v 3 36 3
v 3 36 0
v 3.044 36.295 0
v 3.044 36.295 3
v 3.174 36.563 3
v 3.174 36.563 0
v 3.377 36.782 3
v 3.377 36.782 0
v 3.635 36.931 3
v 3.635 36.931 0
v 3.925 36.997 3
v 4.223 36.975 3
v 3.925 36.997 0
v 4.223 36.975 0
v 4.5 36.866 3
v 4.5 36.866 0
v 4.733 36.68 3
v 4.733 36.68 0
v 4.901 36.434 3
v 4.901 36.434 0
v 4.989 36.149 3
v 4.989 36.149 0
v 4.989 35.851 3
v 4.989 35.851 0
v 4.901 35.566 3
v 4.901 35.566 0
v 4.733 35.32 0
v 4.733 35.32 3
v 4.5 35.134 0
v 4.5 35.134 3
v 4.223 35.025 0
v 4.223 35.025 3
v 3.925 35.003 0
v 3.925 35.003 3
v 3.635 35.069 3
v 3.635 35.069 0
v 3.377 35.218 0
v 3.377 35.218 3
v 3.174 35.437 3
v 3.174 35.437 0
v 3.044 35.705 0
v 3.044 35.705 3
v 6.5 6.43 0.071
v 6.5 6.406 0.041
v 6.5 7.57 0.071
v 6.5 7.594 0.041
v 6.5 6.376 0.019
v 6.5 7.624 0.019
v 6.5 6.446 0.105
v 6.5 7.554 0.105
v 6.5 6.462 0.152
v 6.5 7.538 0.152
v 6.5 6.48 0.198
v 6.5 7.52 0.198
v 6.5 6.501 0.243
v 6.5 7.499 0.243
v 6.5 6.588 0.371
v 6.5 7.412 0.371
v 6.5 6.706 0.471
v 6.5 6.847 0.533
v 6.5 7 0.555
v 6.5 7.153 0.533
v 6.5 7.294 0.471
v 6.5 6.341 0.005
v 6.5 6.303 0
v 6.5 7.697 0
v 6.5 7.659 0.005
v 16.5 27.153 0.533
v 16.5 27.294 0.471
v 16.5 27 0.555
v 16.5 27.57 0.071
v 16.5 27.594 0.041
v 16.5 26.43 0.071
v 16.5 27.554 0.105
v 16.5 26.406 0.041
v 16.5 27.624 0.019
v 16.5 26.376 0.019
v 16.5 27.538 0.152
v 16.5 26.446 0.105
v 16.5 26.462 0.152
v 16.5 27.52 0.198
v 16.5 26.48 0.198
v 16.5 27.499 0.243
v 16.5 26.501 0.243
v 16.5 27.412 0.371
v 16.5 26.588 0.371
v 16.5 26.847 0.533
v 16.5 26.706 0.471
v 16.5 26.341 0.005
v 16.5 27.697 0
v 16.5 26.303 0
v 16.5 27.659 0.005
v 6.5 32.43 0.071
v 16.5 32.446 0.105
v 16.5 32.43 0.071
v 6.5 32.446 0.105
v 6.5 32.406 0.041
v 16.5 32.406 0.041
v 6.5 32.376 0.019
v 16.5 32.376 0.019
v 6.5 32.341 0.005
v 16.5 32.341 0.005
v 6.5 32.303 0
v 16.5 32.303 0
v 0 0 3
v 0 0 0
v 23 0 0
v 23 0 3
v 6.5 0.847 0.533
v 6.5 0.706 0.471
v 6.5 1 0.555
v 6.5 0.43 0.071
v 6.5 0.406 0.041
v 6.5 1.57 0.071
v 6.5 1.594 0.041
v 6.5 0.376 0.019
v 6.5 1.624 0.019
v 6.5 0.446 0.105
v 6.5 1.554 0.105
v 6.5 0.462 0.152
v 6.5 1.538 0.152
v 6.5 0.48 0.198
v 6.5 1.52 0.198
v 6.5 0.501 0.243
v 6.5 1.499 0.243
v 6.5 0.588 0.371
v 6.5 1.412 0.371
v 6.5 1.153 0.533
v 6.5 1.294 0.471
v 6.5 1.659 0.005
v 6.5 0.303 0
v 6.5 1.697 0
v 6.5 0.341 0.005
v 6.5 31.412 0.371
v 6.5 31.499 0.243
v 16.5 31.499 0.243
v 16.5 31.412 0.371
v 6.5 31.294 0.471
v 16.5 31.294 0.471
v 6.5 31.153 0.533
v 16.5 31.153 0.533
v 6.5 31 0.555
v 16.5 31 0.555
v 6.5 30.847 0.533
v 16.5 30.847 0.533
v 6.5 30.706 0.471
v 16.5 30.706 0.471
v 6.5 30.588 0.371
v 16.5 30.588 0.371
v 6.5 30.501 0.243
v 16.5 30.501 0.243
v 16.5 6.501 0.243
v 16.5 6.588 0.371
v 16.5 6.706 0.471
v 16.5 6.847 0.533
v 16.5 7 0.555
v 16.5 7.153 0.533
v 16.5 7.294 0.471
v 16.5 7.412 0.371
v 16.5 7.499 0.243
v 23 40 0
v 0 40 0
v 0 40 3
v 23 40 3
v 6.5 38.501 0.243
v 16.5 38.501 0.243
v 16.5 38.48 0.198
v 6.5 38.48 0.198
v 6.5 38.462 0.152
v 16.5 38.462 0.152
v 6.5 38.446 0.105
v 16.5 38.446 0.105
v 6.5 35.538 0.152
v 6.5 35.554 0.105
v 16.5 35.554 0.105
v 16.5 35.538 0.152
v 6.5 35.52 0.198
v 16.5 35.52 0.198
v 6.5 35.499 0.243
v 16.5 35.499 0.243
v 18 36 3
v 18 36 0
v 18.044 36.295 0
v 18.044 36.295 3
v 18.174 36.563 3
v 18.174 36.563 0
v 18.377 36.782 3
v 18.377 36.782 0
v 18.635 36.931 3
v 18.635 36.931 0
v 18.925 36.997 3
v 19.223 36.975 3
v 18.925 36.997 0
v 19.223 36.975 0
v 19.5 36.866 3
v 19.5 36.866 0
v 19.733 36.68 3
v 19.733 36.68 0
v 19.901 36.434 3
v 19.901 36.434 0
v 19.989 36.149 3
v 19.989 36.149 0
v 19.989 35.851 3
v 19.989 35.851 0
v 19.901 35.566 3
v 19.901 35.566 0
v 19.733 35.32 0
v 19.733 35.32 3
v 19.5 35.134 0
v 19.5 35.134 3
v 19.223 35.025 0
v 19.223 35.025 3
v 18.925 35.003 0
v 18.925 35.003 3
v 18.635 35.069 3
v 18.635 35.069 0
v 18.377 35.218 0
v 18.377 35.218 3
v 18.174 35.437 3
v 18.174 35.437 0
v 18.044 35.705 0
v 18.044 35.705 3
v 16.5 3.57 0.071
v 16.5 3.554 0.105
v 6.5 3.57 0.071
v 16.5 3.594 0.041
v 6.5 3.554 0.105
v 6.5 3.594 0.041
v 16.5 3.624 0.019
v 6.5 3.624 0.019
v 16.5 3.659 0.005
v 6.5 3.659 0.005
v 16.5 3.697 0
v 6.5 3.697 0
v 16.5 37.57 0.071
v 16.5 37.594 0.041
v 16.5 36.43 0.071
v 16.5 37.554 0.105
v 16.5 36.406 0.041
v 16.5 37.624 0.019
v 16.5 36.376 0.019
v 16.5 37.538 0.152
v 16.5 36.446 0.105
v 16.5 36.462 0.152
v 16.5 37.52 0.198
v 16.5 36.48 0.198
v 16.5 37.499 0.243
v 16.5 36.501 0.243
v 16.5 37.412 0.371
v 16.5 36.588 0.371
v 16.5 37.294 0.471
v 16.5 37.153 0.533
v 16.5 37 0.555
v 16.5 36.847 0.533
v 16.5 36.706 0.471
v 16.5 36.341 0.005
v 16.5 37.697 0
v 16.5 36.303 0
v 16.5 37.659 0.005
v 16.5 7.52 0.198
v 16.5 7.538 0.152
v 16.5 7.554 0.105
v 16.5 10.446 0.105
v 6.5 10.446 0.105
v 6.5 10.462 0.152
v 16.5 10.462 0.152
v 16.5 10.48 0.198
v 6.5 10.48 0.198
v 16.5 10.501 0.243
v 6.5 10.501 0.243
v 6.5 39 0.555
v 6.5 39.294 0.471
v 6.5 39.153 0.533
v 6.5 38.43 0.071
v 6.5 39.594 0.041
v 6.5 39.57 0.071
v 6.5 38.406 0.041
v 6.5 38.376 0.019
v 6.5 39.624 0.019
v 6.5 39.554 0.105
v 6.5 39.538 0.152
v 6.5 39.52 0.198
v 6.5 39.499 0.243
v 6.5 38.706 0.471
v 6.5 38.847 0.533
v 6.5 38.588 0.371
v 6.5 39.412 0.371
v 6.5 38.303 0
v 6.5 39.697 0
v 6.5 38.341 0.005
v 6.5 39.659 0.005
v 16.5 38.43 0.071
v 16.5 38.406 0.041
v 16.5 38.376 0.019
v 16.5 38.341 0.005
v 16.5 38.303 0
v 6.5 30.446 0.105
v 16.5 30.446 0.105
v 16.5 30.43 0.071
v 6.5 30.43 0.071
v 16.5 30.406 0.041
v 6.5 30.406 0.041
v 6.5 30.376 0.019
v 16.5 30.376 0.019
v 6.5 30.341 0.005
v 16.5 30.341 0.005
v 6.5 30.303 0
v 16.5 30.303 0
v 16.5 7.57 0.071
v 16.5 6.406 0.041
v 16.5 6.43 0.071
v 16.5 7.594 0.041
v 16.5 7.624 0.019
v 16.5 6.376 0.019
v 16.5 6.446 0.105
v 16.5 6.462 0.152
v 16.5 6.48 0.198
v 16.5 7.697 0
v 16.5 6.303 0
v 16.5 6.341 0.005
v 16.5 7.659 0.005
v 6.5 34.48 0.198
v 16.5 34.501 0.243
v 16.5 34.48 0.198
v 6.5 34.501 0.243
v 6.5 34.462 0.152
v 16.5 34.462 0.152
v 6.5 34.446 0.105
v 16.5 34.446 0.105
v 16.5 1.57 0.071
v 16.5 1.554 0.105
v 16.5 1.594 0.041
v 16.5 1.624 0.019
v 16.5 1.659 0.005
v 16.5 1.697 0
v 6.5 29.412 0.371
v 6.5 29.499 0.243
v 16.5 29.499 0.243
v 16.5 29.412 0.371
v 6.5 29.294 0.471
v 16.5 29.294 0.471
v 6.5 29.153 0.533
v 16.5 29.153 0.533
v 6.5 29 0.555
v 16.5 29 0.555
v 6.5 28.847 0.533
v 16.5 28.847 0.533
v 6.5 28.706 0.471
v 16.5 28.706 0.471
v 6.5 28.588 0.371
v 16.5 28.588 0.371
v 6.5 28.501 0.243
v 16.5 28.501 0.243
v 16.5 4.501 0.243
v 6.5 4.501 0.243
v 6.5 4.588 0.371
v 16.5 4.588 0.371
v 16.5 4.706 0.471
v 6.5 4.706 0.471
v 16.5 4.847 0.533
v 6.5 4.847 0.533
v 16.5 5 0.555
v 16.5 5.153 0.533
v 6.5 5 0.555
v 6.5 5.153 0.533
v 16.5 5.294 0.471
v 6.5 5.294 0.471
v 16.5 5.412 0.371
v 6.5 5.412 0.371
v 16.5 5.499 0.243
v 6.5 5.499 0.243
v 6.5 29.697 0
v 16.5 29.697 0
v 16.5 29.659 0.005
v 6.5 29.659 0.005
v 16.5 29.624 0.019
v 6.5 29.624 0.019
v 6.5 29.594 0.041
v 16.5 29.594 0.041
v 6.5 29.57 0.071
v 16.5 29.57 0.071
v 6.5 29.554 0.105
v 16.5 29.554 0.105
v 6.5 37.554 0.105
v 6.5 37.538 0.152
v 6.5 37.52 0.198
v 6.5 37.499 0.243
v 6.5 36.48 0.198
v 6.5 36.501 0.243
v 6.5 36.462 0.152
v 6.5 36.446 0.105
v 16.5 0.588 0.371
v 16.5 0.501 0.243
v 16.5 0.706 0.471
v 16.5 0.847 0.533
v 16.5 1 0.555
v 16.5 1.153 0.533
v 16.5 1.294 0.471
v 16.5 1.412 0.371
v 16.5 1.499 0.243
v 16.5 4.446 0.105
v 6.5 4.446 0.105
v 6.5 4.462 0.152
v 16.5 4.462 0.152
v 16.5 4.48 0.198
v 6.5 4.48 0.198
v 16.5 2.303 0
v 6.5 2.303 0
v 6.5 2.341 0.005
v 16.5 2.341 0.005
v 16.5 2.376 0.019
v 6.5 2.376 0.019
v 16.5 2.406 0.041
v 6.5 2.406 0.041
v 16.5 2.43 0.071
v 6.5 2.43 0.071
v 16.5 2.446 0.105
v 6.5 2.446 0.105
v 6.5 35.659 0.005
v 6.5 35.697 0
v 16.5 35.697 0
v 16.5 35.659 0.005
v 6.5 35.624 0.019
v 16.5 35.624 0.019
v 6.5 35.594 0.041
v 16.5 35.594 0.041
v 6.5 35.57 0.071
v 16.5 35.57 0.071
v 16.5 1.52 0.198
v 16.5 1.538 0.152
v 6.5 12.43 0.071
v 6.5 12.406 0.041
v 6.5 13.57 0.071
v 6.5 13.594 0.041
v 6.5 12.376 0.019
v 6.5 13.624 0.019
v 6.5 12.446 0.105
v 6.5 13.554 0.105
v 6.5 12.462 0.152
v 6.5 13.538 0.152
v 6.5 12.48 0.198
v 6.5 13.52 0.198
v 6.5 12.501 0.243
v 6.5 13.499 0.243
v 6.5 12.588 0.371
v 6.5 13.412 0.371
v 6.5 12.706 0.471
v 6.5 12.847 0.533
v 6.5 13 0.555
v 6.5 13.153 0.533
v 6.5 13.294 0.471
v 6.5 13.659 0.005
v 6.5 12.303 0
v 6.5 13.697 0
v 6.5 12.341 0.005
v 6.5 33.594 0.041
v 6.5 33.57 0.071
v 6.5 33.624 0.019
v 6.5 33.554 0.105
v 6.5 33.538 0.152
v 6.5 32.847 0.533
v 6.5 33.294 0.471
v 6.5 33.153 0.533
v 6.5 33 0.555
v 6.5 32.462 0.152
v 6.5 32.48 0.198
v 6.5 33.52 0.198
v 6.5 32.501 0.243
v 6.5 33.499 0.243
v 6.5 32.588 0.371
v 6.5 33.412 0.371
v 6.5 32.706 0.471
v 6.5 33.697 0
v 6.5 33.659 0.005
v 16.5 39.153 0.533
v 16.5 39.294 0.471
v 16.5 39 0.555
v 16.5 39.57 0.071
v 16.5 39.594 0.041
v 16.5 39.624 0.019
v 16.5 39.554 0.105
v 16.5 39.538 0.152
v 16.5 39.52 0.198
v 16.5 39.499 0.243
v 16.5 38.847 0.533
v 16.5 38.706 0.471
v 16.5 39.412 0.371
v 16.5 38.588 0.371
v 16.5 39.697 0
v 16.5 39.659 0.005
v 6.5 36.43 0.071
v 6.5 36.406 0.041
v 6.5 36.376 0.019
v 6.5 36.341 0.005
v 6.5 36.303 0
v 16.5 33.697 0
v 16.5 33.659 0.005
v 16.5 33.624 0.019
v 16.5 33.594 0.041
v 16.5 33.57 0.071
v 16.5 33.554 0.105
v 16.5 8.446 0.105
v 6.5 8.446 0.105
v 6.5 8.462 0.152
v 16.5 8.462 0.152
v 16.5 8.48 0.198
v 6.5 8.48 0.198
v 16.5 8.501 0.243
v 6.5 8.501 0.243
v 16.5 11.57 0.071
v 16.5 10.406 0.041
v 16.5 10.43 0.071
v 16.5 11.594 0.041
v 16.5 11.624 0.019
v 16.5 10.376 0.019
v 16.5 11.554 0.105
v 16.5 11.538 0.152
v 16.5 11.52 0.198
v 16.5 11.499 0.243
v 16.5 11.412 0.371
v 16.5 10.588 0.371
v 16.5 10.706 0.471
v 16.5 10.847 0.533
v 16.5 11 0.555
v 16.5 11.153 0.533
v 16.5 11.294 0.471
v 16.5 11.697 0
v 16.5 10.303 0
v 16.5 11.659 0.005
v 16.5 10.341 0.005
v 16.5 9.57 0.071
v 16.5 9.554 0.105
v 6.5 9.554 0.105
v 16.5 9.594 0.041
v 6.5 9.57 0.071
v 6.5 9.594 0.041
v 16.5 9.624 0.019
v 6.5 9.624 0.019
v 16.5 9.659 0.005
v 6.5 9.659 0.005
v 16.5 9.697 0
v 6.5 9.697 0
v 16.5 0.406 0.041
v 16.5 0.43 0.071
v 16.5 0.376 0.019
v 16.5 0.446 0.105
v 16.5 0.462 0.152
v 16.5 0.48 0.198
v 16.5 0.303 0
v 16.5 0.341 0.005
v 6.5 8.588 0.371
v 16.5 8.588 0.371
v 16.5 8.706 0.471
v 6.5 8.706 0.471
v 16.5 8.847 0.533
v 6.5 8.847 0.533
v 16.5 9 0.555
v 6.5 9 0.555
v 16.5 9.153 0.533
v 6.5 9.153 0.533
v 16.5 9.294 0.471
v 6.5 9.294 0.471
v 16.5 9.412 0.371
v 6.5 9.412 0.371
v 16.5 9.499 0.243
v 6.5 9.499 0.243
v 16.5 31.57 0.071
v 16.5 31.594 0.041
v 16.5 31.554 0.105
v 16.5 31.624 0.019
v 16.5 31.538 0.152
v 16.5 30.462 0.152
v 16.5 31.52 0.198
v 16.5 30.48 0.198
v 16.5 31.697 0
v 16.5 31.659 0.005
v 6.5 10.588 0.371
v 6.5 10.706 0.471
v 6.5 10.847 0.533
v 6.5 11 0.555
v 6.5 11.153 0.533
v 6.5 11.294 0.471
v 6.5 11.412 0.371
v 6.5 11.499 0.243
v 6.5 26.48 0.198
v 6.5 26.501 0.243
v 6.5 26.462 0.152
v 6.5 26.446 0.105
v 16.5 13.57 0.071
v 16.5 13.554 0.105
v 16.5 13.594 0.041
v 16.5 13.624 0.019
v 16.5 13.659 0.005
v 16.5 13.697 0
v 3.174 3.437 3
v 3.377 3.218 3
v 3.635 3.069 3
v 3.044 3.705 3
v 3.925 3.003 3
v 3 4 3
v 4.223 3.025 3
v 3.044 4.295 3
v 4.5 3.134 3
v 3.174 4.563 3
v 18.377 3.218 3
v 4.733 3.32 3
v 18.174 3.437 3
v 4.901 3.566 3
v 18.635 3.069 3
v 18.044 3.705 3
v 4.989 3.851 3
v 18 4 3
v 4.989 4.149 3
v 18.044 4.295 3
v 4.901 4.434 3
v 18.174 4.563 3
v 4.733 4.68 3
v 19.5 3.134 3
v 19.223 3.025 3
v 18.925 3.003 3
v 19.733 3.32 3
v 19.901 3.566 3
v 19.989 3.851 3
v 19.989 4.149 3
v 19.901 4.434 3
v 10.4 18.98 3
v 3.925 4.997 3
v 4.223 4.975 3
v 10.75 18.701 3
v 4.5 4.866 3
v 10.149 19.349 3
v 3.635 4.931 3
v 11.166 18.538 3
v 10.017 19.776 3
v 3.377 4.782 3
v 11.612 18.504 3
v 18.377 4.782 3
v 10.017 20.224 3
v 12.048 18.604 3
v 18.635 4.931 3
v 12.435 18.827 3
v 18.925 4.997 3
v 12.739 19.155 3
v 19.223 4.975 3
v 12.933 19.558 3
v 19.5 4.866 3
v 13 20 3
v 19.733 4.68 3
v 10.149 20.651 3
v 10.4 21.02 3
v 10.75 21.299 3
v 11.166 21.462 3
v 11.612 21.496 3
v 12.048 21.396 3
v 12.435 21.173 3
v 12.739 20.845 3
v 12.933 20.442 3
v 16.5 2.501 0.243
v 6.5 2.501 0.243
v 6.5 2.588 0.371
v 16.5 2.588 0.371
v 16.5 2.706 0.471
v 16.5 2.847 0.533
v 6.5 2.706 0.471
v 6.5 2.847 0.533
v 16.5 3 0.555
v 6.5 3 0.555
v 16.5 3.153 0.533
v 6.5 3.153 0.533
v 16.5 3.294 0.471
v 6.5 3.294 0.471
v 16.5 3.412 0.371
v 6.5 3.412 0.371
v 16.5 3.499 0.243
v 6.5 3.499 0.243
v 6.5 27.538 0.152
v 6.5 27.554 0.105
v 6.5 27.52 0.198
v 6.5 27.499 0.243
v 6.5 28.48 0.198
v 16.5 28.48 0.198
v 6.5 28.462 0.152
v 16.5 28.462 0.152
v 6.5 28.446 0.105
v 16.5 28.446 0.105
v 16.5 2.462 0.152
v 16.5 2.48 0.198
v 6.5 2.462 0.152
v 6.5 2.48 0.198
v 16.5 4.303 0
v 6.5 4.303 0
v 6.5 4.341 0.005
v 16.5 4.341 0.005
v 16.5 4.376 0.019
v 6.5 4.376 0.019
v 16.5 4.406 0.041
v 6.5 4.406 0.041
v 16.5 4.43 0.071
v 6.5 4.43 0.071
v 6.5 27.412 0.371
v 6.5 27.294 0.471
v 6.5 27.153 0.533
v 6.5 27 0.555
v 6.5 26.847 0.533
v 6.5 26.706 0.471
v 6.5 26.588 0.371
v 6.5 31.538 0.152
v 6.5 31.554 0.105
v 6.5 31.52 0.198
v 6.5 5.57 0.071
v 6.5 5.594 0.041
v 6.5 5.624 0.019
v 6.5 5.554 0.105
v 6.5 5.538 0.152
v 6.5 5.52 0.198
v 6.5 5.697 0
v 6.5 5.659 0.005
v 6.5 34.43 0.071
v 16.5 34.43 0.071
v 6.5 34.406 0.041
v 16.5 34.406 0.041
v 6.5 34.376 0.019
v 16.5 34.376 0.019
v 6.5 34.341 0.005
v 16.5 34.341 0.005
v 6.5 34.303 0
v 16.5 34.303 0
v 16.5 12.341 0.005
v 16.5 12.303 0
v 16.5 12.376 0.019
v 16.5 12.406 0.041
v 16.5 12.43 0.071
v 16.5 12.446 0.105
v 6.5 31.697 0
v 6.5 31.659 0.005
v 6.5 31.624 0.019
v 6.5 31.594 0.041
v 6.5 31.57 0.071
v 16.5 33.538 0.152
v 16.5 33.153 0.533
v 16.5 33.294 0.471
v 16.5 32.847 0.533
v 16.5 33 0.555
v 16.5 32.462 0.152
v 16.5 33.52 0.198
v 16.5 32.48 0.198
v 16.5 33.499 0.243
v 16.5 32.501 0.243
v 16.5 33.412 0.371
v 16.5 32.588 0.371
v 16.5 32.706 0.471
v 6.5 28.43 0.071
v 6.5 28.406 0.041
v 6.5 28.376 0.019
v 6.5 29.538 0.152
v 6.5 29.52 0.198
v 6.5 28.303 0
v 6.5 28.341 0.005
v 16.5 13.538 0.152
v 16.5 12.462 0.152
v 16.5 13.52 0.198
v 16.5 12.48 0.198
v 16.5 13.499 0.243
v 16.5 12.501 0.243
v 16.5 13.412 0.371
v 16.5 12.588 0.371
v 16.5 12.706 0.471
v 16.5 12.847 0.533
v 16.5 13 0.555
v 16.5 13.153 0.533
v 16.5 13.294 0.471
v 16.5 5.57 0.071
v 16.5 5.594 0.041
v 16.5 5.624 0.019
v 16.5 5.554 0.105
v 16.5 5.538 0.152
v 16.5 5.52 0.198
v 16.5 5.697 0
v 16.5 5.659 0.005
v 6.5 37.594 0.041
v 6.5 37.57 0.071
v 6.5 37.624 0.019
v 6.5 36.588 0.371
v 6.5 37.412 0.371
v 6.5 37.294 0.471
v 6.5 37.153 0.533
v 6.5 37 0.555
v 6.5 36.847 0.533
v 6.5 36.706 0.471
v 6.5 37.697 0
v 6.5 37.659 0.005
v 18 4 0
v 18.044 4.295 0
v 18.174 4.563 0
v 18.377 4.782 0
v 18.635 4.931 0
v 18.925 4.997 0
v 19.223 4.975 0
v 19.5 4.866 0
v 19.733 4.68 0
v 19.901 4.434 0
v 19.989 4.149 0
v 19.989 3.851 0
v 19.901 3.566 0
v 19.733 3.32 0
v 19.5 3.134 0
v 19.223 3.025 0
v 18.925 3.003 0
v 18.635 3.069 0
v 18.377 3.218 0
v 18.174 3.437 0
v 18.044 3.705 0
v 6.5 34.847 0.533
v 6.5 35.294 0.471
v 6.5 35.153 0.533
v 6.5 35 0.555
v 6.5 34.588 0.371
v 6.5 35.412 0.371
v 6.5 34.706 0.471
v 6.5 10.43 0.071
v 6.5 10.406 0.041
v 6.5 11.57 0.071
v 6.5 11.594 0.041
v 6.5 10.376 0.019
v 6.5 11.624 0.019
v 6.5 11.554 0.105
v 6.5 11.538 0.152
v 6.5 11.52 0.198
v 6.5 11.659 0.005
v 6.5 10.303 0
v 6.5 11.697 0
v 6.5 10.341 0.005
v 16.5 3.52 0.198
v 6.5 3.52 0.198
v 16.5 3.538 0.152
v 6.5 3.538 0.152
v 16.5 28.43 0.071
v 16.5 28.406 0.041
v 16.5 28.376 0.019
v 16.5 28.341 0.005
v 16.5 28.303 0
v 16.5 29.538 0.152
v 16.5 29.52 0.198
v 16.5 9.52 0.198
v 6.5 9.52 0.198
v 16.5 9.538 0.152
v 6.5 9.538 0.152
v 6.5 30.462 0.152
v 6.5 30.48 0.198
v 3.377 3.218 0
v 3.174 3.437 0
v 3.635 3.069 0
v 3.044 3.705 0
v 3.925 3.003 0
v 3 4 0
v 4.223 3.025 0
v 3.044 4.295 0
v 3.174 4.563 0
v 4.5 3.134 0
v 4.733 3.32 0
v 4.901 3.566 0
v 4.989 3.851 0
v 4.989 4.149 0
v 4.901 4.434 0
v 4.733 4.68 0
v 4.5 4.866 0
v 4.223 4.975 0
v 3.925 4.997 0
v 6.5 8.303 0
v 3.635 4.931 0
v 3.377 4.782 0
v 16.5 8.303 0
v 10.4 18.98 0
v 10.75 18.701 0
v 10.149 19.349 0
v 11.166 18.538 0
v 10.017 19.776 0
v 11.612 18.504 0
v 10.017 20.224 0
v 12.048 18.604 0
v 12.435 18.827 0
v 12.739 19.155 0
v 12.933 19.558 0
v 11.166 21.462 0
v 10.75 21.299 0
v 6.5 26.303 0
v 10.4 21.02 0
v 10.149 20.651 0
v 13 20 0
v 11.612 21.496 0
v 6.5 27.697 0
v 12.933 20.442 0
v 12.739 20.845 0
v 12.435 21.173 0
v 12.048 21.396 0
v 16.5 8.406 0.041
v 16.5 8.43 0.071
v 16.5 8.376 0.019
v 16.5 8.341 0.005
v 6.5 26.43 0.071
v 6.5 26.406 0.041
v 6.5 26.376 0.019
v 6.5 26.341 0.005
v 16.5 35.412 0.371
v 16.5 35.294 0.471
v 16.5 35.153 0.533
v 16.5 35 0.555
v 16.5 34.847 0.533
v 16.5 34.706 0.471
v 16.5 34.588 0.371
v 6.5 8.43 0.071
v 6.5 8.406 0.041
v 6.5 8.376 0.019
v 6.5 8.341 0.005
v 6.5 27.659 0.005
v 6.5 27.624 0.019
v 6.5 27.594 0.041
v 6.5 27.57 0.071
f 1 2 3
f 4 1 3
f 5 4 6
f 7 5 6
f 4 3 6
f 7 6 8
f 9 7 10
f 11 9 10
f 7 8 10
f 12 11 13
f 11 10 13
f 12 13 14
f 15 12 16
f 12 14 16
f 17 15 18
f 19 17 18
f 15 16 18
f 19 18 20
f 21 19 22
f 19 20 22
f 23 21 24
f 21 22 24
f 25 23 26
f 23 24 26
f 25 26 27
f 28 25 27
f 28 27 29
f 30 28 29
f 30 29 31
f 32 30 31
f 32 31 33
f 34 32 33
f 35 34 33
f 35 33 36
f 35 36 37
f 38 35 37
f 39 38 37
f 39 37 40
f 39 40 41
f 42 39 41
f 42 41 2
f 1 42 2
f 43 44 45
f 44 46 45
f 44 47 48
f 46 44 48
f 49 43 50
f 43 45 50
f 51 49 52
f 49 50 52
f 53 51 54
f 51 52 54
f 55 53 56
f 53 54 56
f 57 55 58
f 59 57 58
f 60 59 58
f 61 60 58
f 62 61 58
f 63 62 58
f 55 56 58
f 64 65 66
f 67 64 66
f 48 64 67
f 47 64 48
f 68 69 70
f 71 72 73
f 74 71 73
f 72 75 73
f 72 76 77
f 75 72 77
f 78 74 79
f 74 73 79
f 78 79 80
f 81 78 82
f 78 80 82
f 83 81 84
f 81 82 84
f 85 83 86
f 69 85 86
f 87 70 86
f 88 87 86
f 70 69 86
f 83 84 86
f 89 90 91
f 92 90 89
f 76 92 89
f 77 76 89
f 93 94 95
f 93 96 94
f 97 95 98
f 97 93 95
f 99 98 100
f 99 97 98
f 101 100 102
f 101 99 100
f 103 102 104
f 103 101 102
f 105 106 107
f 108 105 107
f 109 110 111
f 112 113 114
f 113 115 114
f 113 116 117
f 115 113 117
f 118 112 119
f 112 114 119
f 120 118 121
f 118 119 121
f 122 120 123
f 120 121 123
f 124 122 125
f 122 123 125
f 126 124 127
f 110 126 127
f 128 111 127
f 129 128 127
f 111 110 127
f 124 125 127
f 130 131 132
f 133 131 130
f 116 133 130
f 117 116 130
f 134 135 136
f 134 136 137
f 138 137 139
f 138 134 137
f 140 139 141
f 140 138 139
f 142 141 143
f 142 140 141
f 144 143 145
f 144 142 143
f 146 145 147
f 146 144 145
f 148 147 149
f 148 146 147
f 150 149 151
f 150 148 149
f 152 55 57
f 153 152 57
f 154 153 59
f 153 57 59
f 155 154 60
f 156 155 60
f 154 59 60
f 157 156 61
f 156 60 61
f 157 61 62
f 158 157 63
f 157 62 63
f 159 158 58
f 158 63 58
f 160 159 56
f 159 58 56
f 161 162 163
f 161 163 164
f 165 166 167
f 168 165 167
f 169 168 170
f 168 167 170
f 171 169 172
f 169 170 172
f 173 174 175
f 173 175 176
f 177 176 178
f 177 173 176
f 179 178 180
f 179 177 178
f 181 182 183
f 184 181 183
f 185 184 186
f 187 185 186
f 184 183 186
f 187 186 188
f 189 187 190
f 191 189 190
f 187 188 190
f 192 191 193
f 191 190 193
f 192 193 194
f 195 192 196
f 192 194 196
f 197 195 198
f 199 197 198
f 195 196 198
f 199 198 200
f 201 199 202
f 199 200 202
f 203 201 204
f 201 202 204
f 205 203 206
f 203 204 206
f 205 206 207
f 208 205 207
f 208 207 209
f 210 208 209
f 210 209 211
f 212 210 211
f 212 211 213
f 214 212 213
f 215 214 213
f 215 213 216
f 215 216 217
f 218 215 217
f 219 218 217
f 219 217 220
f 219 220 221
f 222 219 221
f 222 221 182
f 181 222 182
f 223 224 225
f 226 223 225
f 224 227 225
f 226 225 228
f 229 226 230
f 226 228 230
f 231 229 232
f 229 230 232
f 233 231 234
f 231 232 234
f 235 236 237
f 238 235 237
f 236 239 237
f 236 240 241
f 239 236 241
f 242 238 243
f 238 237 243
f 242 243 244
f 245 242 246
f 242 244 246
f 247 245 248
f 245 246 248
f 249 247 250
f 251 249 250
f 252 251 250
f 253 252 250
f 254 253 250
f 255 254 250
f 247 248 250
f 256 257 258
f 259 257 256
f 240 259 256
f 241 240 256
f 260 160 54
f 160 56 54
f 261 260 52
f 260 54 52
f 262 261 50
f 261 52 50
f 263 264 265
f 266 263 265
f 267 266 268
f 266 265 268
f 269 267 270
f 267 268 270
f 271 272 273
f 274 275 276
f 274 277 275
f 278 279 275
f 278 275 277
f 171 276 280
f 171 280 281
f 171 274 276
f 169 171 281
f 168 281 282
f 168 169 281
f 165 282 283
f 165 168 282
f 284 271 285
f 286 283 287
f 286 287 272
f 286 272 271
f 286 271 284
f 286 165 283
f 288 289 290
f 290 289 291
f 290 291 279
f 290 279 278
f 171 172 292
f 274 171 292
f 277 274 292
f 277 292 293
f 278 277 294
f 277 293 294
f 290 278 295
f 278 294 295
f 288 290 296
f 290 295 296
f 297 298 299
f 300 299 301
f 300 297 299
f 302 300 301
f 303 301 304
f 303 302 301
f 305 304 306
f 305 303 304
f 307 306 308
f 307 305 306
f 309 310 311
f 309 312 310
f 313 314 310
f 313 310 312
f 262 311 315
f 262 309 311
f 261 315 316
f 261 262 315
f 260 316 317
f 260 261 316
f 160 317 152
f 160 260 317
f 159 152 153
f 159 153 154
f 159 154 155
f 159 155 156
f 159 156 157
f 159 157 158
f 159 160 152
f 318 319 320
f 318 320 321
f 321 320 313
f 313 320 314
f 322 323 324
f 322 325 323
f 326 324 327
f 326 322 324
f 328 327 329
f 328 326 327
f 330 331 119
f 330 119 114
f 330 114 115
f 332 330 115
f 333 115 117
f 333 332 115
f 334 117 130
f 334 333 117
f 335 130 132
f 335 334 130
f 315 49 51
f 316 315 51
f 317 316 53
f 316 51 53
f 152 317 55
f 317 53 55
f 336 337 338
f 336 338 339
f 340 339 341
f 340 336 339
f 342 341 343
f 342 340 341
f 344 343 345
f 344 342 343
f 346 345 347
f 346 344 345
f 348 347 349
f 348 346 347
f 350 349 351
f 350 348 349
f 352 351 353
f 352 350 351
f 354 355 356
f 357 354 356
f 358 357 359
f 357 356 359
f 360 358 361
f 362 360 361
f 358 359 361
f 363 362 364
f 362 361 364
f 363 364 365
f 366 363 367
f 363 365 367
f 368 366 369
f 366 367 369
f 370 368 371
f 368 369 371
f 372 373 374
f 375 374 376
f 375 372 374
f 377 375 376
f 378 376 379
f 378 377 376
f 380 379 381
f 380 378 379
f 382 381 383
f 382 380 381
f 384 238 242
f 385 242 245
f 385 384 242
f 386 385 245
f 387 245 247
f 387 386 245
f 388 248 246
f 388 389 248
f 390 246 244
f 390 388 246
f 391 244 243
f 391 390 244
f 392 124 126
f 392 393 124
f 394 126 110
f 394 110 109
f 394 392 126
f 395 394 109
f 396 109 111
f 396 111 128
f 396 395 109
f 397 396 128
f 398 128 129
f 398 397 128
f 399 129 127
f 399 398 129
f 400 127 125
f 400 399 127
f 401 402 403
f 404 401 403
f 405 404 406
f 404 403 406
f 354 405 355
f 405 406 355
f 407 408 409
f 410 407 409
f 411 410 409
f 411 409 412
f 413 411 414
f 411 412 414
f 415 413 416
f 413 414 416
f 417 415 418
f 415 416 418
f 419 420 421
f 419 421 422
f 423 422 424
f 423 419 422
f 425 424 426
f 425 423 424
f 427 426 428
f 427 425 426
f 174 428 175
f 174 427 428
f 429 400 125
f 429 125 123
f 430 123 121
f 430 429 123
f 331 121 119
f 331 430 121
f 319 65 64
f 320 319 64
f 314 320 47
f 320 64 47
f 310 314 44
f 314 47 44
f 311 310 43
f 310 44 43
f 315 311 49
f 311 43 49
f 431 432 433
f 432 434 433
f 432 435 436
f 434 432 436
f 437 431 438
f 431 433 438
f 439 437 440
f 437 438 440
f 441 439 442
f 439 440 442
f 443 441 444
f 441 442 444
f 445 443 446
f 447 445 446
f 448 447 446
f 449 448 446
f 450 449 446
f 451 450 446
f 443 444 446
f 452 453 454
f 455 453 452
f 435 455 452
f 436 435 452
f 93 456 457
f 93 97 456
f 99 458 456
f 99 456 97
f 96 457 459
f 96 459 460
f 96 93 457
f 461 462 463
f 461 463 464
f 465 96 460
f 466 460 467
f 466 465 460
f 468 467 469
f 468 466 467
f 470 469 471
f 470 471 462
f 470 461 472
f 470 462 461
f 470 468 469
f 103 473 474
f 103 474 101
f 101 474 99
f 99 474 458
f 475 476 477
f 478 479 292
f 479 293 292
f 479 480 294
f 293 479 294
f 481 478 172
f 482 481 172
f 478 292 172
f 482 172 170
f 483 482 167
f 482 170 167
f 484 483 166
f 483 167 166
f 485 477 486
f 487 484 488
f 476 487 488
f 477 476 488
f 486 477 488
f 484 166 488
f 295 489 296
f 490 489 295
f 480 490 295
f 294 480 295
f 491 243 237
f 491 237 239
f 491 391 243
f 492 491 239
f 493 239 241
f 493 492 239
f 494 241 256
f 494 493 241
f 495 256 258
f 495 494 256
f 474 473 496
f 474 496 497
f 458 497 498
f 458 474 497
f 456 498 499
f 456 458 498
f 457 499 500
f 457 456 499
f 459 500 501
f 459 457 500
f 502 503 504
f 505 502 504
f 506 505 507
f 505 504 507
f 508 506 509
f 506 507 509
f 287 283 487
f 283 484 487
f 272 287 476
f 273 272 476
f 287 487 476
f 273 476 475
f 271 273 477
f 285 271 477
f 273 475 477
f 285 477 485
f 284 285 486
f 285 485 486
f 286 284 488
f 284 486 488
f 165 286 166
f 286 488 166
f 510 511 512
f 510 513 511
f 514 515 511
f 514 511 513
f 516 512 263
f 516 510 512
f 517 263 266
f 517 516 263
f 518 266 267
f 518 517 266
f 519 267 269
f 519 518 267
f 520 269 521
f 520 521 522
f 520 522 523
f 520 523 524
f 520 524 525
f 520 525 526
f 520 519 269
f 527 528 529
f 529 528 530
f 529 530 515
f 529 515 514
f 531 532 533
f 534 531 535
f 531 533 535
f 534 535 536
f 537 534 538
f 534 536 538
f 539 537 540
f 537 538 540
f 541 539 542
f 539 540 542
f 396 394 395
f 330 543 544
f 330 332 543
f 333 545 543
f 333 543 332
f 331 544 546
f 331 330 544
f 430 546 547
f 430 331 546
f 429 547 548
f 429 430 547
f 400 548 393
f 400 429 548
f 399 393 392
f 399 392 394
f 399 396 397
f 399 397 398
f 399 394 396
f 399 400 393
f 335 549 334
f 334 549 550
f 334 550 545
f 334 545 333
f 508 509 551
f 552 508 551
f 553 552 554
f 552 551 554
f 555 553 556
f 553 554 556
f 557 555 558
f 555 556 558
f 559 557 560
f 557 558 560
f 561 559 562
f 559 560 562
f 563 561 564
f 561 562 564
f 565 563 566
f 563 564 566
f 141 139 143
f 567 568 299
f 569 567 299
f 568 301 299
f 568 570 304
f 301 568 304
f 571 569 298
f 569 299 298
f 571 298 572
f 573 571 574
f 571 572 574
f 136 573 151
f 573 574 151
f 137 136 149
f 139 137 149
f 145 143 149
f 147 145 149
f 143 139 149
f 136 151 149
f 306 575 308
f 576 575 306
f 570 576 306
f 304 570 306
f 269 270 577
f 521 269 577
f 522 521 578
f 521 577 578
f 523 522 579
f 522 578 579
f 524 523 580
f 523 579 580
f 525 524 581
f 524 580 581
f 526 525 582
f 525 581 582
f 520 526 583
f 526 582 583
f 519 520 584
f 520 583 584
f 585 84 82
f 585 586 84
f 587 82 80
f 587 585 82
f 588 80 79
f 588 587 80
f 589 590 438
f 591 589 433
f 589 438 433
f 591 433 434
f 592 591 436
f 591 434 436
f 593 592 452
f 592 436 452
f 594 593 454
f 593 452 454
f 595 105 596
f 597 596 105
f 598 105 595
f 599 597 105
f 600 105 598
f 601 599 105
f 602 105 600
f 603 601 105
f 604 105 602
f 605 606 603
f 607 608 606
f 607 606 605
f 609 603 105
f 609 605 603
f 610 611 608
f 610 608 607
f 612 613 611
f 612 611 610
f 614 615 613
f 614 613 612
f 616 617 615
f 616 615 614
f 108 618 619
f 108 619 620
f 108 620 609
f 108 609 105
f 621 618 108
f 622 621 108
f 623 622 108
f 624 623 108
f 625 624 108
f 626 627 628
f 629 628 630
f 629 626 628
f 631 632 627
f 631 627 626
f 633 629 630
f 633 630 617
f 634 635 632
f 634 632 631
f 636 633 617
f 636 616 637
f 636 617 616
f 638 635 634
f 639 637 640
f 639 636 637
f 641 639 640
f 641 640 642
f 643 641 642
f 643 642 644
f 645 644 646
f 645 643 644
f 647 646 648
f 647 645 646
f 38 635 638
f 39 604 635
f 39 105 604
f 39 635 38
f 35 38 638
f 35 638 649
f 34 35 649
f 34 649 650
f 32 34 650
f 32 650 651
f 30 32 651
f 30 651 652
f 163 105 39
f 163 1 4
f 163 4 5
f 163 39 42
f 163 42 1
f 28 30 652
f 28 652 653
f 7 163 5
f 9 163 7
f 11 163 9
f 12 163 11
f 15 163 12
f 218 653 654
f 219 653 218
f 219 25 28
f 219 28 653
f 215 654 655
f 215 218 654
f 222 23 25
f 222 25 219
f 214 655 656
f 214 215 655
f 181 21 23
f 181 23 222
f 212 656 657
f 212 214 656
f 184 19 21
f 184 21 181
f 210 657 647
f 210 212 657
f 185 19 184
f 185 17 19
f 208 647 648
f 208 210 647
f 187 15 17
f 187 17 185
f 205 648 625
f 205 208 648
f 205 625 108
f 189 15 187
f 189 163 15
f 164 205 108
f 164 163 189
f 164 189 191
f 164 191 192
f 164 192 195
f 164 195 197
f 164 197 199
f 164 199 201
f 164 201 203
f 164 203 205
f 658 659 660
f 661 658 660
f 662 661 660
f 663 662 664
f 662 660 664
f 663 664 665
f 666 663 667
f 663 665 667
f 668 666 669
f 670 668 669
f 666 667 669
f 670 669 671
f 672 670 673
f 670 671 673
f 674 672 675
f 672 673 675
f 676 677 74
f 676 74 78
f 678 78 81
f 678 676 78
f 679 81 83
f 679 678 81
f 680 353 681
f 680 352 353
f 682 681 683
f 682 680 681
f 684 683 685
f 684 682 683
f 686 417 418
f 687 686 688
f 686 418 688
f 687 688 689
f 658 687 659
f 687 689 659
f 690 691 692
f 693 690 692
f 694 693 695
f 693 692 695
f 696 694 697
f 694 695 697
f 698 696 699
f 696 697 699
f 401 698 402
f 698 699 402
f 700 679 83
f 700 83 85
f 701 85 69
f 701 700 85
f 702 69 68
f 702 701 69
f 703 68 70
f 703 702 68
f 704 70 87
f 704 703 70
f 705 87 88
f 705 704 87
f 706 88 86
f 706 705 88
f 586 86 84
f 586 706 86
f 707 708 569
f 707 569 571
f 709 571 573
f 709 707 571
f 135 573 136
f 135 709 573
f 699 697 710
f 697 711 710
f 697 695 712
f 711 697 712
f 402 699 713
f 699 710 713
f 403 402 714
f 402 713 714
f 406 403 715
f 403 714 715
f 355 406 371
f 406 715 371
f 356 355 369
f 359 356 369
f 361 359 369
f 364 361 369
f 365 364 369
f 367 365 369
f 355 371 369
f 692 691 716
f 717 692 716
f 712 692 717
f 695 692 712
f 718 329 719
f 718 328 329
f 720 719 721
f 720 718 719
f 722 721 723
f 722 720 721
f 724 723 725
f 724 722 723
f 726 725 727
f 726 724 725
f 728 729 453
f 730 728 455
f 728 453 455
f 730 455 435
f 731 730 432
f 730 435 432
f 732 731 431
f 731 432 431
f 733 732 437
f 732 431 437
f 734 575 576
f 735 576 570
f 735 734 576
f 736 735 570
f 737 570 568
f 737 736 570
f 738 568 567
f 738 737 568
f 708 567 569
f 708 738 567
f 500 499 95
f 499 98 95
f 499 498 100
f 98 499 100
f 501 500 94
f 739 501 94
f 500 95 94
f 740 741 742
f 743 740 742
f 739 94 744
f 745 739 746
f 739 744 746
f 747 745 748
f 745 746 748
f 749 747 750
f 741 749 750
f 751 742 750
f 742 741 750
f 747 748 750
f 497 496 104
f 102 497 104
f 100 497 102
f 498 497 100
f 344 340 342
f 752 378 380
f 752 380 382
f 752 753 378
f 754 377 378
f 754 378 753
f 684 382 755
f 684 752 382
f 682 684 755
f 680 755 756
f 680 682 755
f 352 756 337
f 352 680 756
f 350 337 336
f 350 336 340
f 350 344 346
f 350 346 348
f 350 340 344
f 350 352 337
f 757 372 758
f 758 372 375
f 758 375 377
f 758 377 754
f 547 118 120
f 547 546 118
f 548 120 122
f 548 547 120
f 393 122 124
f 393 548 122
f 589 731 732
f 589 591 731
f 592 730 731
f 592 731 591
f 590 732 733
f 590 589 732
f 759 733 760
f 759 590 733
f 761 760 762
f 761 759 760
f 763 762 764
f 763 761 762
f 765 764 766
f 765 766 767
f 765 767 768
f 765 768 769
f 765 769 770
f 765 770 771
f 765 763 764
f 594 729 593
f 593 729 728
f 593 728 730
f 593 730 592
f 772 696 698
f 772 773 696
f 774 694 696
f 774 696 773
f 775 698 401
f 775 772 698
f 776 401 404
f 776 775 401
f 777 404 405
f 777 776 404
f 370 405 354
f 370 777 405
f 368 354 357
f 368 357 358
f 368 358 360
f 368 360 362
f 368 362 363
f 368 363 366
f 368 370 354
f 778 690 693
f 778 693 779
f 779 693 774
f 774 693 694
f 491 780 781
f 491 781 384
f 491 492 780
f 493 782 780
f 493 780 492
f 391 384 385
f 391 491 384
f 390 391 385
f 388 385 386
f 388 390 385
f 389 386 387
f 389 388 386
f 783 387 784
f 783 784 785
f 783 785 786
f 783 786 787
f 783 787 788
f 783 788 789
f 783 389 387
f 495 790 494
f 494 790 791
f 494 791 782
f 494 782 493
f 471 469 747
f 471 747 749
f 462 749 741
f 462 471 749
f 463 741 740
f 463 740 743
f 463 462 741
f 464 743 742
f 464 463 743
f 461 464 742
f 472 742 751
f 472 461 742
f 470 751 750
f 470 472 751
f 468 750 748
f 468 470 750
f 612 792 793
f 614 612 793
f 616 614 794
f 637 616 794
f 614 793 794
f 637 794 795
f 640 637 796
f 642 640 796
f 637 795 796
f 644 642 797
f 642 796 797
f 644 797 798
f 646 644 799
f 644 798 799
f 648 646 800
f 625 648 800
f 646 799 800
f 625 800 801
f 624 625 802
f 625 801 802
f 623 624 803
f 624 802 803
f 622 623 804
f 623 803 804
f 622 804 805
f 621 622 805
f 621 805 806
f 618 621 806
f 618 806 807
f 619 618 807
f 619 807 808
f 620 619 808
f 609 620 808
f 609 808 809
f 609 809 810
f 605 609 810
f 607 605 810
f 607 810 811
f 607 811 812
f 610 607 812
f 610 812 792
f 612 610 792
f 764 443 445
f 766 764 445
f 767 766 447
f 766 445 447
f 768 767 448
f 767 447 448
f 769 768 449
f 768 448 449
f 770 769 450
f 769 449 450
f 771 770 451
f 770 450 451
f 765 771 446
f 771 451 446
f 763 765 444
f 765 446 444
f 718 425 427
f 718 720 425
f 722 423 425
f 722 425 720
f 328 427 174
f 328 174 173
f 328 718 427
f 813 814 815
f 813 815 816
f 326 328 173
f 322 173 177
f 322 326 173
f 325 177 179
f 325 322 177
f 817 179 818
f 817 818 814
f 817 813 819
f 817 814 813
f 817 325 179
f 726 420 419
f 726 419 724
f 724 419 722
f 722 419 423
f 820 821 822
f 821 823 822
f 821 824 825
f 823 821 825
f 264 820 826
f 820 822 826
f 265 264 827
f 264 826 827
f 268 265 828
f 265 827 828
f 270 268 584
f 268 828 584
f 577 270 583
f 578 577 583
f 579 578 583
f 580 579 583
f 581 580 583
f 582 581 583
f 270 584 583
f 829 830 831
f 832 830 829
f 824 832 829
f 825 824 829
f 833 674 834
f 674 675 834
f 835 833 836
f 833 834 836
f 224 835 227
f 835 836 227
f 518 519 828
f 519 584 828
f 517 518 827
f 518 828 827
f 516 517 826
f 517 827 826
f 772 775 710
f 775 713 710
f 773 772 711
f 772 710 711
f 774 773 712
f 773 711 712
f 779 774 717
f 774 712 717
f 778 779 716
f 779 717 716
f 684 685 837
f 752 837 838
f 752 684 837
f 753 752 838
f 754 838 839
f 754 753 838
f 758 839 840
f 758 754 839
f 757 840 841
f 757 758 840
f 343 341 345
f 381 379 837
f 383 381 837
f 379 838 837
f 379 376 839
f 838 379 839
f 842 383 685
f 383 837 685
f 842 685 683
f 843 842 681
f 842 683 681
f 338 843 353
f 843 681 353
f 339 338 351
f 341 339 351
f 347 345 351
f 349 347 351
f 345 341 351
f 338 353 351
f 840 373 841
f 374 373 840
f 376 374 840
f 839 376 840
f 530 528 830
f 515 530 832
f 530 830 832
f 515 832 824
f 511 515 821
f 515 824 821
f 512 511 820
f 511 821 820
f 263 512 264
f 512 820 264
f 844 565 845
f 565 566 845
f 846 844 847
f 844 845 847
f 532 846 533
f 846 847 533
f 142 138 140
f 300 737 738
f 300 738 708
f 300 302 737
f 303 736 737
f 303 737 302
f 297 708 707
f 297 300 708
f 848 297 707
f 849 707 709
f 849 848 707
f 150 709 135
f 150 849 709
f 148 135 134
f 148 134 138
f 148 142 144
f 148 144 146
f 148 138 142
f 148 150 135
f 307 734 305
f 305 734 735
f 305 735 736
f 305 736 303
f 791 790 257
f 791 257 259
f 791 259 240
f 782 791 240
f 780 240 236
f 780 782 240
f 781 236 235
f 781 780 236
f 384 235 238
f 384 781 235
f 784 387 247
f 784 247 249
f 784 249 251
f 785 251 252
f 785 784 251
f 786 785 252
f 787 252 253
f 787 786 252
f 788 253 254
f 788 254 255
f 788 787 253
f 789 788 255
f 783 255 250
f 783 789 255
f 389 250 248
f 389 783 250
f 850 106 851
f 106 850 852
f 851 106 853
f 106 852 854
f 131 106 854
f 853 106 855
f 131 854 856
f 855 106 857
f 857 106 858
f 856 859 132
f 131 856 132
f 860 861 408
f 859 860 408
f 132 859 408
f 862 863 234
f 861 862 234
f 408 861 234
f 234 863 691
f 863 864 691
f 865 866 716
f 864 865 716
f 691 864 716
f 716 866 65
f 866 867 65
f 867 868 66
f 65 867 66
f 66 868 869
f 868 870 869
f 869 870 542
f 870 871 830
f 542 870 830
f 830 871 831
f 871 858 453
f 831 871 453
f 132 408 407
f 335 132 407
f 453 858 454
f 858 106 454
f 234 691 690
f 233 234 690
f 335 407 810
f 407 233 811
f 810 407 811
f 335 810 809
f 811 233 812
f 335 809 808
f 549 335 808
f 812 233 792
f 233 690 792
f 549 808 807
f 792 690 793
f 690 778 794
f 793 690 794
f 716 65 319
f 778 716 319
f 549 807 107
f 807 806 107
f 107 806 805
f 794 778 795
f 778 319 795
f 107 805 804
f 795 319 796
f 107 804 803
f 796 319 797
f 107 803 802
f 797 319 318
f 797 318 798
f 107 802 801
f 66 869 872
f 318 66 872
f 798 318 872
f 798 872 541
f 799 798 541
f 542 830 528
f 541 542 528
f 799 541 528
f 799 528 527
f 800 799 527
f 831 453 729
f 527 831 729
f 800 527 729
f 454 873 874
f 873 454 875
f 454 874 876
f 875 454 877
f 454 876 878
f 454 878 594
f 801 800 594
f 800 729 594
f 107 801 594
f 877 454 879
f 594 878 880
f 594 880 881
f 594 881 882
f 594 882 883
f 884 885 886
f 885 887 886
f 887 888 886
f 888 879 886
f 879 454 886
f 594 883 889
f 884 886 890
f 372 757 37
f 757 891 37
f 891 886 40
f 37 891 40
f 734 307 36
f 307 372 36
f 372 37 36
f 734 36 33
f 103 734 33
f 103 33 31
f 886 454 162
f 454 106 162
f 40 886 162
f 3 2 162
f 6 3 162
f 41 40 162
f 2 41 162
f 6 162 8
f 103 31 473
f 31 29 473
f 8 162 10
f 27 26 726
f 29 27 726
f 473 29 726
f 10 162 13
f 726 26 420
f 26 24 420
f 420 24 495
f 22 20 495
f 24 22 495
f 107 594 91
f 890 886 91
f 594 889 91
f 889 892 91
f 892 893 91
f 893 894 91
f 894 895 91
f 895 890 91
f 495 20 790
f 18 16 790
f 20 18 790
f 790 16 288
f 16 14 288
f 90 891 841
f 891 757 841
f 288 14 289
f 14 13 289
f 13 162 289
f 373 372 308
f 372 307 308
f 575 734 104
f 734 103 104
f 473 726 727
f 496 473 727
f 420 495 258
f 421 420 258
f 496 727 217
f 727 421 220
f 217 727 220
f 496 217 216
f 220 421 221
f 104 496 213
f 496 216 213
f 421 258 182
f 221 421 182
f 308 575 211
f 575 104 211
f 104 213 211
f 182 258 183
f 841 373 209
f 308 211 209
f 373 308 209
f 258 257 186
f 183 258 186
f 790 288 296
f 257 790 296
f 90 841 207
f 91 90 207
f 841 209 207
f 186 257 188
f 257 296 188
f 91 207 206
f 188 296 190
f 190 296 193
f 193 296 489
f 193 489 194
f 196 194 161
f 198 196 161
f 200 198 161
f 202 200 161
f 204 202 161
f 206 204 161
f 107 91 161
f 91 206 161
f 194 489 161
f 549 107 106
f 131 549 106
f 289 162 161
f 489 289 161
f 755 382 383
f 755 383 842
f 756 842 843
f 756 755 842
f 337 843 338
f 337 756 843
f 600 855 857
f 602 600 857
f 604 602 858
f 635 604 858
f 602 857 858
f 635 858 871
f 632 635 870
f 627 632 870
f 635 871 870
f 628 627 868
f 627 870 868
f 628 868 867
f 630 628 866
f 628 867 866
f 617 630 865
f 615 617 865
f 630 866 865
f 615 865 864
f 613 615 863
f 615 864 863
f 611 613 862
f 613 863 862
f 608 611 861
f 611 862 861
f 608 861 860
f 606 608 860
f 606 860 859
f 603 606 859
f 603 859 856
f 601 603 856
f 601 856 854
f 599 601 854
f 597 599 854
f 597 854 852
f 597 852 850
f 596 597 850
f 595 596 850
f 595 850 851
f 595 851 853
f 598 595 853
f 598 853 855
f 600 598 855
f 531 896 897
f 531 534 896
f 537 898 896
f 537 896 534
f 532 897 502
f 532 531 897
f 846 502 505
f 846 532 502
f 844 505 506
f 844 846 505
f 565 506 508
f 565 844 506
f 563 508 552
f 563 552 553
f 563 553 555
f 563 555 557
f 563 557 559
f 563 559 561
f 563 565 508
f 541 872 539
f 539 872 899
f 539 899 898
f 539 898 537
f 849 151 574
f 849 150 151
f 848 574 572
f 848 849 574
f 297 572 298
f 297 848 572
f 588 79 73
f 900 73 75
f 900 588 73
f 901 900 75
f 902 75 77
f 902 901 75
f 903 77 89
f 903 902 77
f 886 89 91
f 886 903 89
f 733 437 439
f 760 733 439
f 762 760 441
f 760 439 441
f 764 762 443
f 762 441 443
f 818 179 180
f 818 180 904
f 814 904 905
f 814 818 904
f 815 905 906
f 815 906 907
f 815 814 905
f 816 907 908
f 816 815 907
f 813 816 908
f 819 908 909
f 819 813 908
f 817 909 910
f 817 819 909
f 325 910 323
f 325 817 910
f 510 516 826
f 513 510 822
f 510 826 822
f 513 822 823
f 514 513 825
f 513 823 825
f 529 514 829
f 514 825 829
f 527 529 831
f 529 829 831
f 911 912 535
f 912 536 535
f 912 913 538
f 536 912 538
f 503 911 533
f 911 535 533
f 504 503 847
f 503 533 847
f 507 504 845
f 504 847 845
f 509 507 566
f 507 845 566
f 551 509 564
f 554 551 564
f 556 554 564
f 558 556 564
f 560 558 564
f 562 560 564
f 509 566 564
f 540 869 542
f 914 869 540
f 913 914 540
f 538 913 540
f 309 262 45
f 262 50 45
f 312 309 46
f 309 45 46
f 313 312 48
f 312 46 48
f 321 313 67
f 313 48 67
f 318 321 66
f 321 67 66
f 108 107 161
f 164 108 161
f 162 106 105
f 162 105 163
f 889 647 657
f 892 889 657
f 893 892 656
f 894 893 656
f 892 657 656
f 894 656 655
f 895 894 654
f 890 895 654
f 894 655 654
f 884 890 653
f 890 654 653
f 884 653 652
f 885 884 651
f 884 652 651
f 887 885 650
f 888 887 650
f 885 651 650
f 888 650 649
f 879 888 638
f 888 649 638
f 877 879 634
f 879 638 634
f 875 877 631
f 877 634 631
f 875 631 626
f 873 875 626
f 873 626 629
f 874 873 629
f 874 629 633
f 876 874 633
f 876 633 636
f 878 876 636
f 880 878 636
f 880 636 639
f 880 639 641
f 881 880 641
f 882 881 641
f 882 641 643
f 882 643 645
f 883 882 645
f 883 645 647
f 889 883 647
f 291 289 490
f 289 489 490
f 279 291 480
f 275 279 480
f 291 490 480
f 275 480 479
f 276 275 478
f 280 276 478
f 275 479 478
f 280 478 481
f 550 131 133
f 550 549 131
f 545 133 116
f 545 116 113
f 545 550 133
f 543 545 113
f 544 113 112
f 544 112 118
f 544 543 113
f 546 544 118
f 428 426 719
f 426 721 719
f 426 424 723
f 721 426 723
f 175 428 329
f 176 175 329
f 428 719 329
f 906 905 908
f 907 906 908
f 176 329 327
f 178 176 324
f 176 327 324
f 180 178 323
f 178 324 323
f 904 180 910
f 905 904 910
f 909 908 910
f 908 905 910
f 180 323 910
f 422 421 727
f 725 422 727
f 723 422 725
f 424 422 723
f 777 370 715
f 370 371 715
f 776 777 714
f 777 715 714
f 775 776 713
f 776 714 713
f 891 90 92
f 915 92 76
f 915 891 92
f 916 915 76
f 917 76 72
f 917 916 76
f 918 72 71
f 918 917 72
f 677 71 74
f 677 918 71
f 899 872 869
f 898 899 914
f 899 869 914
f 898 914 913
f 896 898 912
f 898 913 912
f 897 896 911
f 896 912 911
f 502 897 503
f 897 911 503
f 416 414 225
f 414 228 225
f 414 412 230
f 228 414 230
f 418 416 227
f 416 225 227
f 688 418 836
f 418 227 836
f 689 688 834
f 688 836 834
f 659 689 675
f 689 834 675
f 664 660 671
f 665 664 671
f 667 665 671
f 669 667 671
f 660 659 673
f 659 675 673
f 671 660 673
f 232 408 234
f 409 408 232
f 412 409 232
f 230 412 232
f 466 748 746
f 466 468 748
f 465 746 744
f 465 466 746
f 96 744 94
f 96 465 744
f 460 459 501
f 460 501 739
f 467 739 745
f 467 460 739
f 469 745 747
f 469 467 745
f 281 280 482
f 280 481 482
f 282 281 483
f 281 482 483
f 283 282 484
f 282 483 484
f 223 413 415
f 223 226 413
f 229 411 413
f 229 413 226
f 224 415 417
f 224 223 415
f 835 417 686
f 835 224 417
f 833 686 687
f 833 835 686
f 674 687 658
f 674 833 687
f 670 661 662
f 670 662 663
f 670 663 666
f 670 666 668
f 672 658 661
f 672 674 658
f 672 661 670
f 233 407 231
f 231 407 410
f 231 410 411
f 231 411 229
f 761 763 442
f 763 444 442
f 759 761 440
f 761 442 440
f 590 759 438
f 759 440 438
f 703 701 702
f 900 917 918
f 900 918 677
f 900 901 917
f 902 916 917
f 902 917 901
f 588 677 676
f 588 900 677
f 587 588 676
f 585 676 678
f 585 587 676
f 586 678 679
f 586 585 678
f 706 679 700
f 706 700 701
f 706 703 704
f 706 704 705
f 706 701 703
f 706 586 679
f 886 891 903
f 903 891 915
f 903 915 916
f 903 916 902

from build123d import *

# Parameters (mm, degrees)
SKETCH1_W           = 23
SKETCH1_H           = 40
BOSS_EXTRUDE1_DEPTH = 3
SKETCH2_R           = 1.5
CUT_EXTRUDE1_DEPTH  = 4
CUT_EXTRUDE4_DEPTH  = 5
SKETCH4_R           = 1
CUT_EXTRUDE5_DEPTH  = 4


with BuildPart() as part:
    # Sketch1 → Boss-Extrude1 (new body)
    with BuildSketch(Plane.XY):
        with Locations((11.5, 20)):
            Rectangle(SKETCH1_W, SKETCH1_H)
    extrude(amount=BOSS_EXTRUDE1_DEPTH)

    # Sketch2 → Cut-Extrude1 (cut, through all)
    with BuildSketch(Plane.XY.offset(3)):
        with Locations((11.5, 20)):
            Circle(SKETCH2_R)
    extrude(amount=-CUT_EXTRUDE1_DEPTH, mode=Mode.SUBTRACT)

    # Sketch3 → Cut-Extrude4 (cut, symmetric)
    with BuildSketch(Plane(origin=(11.5, 0, 0), x_dir=(0, 0, -1), z_dir=(1, 0, 0))):
        with BuildLine():
            Line((0, 13.697030082), (0, 12.302969918))
            ThreePointArc((0, 12.302969918), (-0.029066134, 12.391711115), (-0.105, 12.446060799))
            ThreePointArc((-0.105, 12.446060799), (-0.175126488, 12.471018632), (-0.243202247, 12.501123596))
            ThreePointArc((-0.243202247, 12.501123596), (-0.555, 13), (-0.243202247, 13.498876404))
            ThreePointArc((-0.243202247, 13.498876404), (-0.175126488, 13.528981368), (-0.105, 13.553939201))
            ThreePointArc((-0.105, 13.553939201), (-0.029066134, 13.608288885), (0, 13.697030082))
        make_face()
        with BuildLine():
            Line((0, 11.697030082), (0, 10.302969918))
            ThreePointArc((0, 10.302969918), (-0.029066134, 10.391711115), (-0.105, 10.446060799))
            ThreePointArc((-0.105, 10.446060799), (-0.175126488, 10.471018632), (-0.243202247, 10.501123596))
            ThreePointArc((-0.243202247, 10.501123596), (-0.555, 11), (-0.243202247, 11.498876404))
            ThreePointArc((-0.243202247, 11.498876404), (-0.175126488, 11.528981368), (-0.105, 11.553939201))
            ThreePointArc((-0.105, 11.553939201), (-0.029066134, 11.608288885), (0, 11.697030082))
        make_face()
        with BuildLine():
            Line((0, 9.697030082), (0, 8.302969918))
            ThreePointArc((0, 8.302969918), (-0.029066134, 8.391711115), (-0.105, 8.446060799))
            ThreePointArc((-0.105, 8.446060799), (-0.175126488, 8.471018632), (-0.243202247, 8.501123596))
            ThreePointArc((-0.243202247, 8.501123596), (-0.555, 9), (-0.243202247, 9.498876404))
            ThreePointArc((-0.243202247, 9.498876404), (-0.175126488, 9.528981368), (-0.105, 9.553939201))
            ThreePointArc((-0.105, 9.553939201), (-0.029066134, 9.608288885), (0, 9.697030082))
        make_face()
        with BuildLine():
            Line((0, 7.697030082), (0, 6.302969918))
            ThreePointArc((0, 6.302969918), (-0.029066134, 6.391711115), (-0.105, 6.446060799))
            ThreePointArc((-0.105, 6.446060799), (-0.175126488, 6.471018632), (-0.243202247, 6.501123596))
            ThreePointArc((-0.243202247, 6.501123596), (-0.555, 7), (-0.243202247, 7.498876404))
            ThreePointArc((-0.243202247, 7.498876404), (-0.175126488, 7.528981368), (-0.105, 7.553939201))
            ThreePointArc((-0.105, 7.553939201), (-0.029066134, 7.608288885), (0, 7.697030082))
        make_face()
        with BuildLine():
            Line((0, 5.697030082), (0, 4.302969918))
            ThreePointArc((0, 4.302969918), (-0.029066134, 4.391711115), (-0.105, 4.446060799))
            ThreePointArc((-0.105, 4.446060799), (-0.175126488, 4.471018632), (-0.243202247, 4.501123596))
            ThreePointArc((-0.243202247, 4.501123596), (-0.555, 5), (-0.243202247, 5.498876404))
            ThreePointArc((-0.243202247, 5.498876404), (-0.175126488, 5.528981368), (-0.105, 5.553939201))
            ThreePointArc((-0.105, 5.553939201), (-0.029066134, 5.608288885), (0, 5.697030082))
        make_face()
        with BuildLine():
            Line((0, 3.697030082), (0, 2.302969918))
            ThreePointArc((0, 2.302969918), (-0.029066134, 2.391711115), (-0.105, 2.446060799))
            ThreePointArc((-0.105, 2.446060799), (-0.175126488, 2.471018632), (-0.243202247, 2.501123596))
            ThreePointArc((-0.243202247, 2.501123596), (-0.555, 3), (-0.243202247, 3.498876404))
            ThreePointArc((-0.243202247, 3.498876404), (-0.175126488, 3.528981368), (-0.105, 3.553939201))
            ThreePointArc((-0.105, 3.553939201), (-0.029066134, 3.608288885), (0, 3.697030082))
        make_face()
        with BuildLine():
            Line((0, 1.697030082), (0, 0.302969918))
            ThreePointArc((0, 0.302969918), (-0.029066134, 0.391711115), (-0.105, 0.446060799))
            ThreePointArc((-0.105, 0.446060799), (-0.175126488, 0.471018632), (-0.243202247, 0.501123596))
            ThreePointArc((-0.243202247, 0.501123596), (-0.555, 1), (-0.243202247, 1.498876404))
            ThreePointArc((-0.243202247, 1.498876404), (-0.175126488, 1.528981368), (-0.105, 1.553939201))
            ThreePointArc((-0.105, 1.553939201), (-0.029066134, 1.608288885), (0, 1.697030082))
        make_face()
    cut_extrude4 = extrude(amount=CUT_EXTRUDE4_DEPTH, both=True, mode=Mode.SUBTRACT)

    # Mirror1: Cut-Extrude4 across plane
    add(cut_extrude4.mirror(Plane(origin=(0, 20, 0), x_dir=(0, 0, 1), z_dir=(0, -1, 0))), mode=Mode.SUBTRACT)

    # Sketch4 → Cut-Extrude5 (cut, through all)
    with BuildSketch(Plane(origin=(0, 0, 0), x_dir=(-1, 0, 0), z_dir=(0, 0, -1))):
        with Locations((-19, 36)):
            Circle(SKETCH4_R)
        with Locations((-19, 4)):
            Circle(SKETCH4_R)
        with Locations((-4, 4)):
            Circle(SKETCH4_R)
        with Locations((-4, 36)):
            Circle(SKETCH4_R)
    extrude(amount=-CUT_EXTRUDE5_DEPTH, mode=Mode.SUBTRACT)


solid = part.part
